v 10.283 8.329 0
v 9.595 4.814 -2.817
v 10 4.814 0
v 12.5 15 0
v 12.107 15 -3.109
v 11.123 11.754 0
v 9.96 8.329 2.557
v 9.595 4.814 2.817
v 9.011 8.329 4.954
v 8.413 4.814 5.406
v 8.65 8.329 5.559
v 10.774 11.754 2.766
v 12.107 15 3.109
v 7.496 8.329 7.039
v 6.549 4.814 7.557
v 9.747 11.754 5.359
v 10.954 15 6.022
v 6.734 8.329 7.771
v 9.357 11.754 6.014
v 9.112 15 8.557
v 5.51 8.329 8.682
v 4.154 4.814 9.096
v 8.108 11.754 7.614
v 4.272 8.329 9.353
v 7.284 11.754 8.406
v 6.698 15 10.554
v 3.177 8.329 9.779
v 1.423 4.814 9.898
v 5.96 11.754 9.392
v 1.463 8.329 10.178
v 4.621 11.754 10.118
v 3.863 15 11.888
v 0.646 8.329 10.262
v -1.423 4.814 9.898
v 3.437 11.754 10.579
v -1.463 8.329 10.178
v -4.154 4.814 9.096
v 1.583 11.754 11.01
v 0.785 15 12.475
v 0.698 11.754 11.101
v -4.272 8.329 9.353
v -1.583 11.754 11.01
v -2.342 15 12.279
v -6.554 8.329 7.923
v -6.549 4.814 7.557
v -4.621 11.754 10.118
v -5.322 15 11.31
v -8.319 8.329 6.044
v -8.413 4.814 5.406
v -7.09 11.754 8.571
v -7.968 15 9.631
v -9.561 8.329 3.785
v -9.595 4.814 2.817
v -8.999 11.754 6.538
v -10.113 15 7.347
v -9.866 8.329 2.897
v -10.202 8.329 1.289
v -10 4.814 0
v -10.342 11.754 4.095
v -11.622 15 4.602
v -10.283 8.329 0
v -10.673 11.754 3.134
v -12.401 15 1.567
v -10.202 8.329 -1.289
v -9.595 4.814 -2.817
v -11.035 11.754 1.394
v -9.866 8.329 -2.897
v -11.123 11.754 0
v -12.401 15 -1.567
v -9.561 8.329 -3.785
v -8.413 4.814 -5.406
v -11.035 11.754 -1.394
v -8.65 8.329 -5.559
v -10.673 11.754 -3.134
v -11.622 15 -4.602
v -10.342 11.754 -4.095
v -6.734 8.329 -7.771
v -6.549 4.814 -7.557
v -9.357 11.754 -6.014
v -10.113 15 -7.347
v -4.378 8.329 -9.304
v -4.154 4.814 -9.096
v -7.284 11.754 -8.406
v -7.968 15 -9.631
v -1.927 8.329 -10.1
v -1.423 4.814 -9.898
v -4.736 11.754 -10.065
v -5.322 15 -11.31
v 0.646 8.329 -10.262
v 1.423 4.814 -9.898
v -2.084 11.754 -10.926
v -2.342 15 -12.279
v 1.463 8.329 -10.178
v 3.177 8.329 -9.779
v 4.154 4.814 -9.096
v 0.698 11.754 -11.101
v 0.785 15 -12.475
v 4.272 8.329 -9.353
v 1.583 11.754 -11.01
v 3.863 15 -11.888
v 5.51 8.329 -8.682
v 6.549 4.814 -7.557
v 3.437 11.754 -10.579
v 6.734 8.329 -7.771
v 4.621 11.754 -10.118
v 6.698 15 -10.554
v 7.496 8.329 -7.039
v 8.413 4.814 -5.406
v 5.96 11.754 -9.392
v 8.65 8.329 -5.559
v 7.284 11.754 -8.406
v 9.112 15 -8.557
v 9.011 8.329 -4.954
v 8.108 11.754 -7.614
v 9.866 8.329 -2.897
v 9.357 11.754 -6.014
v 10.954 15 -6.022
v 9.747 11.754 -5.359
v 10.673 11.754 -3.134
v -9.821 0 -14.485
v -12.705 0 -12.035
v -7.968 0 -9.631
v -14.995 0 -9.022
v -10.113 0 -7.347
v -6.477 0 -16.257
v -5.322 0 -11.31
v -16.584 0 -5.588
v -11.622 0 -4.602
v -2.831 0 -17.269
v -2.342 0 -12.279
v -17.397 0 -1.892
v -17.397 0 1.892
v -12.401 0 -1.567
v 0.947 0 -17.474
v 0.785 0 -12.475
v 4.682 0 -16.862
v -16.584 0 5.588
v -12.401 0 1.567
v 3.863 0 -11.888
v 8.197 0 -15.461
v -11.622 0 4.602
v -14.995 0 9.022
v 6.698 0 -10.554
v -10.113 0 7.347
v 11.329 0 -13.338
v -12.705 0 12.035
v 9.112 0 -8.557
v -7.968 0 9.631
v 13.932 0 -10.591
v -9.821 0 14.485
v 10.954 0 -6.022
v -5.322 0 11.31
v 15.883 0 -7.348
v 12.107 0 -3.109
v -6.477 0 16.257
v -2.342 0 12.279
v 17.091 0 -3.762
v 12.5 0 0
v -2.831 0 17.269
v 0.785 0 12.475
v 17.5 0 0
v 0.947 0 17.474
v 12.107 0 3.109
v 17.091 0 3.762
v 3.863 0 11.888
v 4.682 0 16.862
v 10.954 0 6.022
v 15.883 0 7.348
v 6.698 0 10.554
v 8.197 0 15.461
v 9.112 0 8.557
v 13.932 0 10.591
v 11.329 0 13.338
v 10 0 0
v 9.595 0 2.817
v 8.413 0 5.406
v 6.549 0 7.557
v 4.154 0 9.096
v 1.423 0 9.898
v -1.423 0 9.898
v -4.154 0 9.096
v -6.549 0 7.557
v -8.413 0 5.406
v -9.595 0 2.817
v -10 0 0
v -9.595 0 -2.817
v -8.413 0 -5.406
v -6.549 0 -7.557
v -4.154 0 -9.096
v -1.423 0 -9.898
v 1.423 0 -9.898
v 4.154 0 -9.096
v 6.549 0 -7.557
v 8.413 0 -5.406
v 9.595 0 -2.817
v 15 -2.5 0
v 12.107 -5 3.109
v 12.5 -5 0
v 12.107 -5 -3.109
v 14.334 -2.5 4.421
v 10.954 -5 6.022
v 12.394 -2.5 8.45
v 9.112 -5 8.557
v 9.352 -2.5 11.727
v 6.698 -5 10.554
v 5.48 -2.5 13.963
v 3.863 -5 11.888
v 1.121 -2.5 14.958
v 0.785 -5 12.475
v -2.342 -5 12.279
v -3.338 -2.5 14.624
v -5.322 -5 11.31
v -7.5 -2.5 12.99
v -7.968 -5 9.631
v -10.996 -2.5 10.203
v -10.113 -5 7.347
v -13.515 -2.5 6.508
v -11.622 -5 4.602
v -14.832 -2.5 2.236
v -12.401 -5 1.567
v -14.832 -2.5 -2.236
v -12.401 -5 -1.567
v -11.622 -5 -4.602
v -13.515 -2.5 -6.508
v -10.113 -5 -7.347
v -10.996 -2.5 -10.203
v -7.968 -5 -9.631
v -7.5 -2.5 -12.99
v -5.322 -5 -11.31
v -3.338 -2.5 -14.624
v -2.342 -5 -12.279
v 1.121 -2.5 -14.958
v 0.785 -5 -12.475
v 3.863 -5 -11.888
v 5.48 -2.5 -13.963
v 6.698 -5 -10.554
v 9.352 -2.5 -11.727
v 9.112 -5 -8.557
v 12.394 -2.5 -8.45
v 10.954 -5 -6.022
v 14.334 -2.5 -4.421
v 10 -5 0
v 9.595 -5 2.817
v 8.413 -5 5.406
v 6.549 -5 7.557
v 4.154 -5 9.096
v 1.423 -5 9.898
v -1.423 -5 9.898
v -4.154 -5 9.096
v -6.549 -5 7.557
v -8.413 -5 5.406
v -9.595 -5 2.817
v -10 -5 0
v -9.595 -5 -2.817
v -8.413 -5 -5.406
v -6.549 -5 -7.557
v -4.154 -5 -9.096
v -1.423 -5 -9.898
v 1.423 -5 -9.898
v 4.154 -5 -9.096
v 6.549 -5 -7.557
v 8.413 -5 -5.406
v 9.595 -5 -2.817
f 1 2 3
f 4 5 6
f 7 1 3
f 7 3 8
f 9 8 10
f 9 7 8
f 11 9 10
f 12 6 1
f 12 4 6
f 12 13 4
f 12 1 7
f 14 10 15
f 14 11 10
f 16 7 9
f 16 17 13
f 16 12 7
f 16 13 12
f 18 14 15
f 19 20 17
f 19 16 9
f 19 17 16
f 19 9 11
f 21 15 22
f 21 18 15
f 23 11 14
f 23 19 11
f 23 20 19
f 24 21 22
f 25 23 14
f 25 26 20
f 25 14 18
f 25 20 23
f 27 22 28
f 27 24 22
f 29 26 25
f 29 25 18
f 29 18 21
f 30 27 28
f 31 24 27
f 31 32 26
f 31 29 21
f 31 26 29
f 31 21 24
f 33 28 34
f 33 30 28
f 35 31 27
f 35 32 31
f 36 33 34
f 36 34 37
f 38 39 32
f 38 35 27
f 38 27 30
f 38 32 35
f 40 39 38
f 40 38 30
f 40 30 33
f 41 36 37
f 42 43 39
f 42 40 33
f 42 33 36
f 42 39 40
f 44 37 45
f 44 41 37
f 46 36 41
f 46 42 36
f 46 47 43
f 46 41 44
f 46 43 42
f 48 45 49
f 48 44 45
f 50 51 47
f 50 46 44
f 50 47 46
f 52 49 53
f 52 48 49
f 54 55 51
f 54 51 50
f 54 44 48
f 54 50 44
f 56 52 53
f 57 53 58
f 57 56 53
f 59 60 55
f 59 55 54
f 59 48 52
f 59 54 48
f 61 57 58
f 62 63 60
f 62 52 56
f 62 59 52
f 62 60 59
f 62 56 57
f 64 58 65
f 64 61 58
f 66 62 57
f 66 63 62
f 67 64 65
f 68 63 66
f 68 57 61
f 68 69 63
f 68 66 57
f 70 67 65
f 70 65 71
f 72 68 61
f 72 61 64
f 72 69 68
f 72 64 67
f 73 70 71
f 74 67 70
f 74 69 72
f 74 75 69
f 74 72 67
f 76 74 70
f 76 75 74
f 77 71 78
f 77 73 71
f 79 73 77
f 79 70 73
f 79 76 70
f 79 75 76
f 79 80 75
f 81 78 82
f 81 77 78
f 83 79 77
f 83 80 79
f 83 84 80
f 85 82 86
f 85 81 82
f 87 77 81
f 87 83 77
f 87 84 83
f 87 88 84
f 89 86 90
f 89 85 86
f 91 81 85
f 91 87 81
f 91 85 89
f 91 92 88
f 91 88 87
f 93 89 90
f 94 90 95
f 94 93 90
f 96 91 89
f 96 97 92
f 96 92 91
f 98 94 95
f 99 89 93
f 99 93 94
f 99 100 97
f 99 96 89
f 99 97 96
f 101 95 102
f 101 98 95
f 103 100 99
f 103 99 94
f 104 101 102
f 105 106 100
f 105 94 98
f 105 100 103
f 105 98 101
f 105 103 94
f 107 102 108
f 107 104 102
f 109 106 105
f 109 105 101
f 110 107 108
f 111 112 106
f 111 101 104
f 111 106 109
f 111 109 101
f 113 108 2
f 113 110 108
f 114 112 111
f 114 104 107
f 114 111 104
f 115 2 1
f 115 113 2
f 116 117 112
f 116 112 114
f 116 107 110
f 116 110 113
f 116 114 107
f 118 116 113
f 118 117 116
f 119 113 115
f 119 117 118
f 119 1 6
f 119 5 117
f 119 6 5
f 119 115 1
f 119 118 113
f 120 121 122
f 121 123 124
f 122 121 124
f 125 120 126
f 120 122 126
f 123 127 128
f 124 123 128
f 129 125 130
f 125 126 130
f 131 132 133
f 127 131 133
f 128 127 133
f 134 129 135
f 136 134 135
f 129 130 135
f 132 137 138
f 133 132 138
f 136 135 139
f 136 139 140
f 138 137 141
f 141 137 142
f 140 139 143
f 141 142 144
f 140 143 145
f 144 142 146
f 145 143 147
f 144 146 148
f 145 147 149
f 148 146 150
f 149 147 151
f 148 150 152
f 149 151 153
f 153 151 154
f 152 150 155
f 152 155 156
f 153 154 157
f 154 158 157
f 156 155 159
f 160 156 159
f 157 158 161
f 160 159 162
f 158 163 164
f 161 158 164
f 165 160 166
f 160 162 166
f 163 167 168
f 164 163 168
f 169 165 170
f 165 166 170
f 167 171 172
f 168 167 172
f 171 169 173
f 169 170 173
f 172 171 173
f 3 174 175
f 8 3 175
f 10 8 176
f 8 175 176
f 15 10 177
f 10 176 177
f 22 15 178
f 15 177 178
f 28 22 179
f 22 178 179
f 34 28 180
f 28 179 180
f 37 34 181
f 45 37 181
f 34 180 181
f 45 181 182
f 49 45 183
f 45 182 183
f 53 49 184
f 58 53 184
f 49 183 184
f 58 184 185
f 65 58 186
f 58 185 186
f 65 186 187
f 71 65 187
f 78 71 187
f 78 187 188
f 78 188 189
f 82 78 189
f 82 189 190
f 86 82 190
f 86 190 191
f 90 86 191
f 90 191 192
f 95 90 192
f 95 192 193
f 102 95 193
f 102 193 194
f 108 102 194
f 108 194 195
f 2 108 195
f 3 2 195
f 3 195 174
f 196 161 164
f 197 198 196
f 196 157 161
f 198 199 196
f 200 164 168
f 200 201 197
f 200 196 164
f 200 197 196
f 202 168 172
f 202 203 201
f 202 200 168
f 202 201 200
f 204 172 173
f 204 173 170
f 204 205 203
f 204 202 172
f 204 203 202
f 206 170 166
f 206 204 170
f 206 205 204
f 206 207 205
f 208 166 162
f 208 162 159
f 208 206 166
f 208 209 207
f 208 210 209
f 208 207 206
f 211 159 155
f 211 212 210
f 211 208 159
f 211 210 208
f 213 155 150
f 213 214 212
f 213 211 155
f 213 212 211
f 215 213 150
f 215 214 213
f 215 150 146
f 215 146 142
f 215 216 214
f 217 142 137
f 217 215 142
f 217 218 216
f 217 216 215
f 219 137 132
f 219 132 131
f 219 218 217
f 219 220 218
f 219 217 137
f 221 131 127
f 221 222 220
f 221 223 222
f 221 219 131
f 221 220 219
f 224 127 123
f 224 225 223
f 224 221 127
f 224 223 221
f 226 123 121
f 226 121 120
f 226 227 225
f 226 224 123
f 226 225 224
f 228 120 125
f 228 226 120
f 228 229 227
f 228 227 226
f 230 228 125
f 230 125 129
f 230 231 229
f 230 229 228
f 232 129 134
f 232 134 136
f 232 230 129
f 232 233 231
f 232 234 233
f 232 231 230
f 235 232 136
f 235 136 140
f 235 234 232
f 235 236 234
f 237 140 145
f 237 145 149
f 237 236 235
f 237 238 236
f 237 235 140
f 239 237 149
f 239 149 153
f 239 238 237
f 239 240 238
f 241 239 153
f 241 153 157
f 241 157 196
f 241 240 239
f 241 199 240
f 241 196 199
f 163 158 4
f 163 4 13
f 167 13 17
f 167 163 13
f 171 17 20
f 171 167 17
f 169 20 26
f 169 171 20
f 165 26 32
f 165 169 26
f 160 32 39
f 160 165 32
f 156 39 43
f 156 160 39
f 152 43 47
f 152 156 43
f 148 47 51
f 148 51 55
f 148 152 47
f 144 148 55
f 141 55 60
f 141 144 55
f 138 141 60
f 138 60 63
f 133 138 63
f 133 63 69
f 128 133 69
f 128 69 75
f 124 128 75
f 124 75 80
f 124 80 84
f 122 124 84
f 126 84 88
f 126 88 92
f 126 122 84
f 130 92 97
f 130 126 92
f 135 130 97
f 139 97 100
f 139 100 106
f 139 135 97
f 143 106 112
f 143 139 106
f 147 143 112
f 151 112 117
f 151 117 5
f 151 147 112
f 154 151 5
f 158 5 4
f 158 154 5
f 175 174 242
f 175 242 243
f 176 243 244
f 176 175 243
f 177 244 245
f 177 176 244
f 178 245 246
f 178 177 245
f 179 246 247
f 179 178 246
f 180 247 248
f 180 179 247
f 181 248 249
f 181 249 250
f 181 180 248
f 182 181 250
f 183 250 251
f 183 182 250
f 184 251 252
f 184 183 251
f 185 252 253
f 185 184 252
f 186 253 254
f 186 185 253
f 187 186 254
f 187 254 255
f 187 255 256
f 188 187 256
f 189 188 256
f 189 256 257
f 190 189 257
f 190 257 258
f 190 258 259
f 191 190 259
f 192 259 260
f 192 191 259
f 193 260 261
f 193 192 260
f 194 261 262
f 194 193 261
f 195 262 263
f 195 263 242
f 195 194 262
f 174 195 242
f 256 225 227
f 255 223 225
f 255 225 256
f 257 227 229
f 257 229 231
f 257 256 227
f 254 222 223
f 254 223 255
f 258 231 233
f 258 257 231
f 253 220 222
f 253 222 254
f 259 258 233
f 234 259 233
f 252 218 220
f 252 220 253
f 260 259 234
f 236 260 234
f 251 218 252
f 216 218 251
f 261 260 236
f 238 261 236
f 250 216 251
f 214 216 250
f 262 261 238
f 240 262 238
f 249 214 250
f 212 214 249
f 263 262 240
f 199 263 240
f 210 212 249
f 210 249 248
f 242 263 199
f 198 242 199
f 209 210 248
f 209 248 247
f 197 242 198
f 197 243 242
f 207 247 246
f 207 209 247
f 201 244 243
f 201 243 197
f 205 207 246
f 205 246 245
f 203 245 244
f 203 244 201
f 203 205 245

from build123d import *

# Parameters (mm, degrees)
F0_R     = 17.5
F0_R_2   = 12.5
F0_R_3   = 10
F1_DEPTH = 5
F2_DEPTH = 15
F4_SIZE  = 4.99999


# Not quite as in the source:
# - a fillet or chamfer that OpenCascade refuses, or shapes differently, is made with other operations: its cross-section is extruded or revolved along the edge and cut away or added
# - a fillet or chamfer is up to 0.001 mm smaller than in the source, because OpenCascade refuses the exact size


with BuildPart() as f1:
    # F0 (on Front) → F1 (new body)
    with BuildSketch(Plane.XZ):
        Circle(F0_R)
        Circle(F0_R_2, mode=Mode.SUBTRACT)
        Circle(F0_R_2)
        Circle(F0_R_3, mode=Mode.SUBTRACT)
    extrude(amount=F1_DEPTH)

    # F0 (on Front) → F2 (join)
    with BuildSketch(Plane.XZ):
        Circle(F0_R_2)
        Circle(F0_R_3, mode=Mode.SUBTRACT)
    extrude(amount=-F2_DEPTH)

    # F3: fillet of radius 22 on 1 edges, made by hand

    # F3_s1 → F3_t2 (revolve, cut)
    with BuildSketch(Plane.XY):
        with BuildLine():
            ThreePointArc((10, 4.8142256063), (10.6341393808, 10.0582698471), (12.5, 15))
            Line((12.5, 15), (10, 15))
            Line((10, 15), (10, 4.8142256063))
        make_face()
    revolve(axis=Axis((0, 15, 0), (0, -1, 0)), mode=Mode.SUBTRACT)

    # F4 (size 5 in the source; OpenCascade refuses exactly that, so slightly less here)
    f4_edges = [f1.edges().sort_by_distance(p)[0] for p in [
        (-17.5, -5, 0),
    ]]
    chamfer(f4_edges, length=F4_SIZE)


solid = f1.part
